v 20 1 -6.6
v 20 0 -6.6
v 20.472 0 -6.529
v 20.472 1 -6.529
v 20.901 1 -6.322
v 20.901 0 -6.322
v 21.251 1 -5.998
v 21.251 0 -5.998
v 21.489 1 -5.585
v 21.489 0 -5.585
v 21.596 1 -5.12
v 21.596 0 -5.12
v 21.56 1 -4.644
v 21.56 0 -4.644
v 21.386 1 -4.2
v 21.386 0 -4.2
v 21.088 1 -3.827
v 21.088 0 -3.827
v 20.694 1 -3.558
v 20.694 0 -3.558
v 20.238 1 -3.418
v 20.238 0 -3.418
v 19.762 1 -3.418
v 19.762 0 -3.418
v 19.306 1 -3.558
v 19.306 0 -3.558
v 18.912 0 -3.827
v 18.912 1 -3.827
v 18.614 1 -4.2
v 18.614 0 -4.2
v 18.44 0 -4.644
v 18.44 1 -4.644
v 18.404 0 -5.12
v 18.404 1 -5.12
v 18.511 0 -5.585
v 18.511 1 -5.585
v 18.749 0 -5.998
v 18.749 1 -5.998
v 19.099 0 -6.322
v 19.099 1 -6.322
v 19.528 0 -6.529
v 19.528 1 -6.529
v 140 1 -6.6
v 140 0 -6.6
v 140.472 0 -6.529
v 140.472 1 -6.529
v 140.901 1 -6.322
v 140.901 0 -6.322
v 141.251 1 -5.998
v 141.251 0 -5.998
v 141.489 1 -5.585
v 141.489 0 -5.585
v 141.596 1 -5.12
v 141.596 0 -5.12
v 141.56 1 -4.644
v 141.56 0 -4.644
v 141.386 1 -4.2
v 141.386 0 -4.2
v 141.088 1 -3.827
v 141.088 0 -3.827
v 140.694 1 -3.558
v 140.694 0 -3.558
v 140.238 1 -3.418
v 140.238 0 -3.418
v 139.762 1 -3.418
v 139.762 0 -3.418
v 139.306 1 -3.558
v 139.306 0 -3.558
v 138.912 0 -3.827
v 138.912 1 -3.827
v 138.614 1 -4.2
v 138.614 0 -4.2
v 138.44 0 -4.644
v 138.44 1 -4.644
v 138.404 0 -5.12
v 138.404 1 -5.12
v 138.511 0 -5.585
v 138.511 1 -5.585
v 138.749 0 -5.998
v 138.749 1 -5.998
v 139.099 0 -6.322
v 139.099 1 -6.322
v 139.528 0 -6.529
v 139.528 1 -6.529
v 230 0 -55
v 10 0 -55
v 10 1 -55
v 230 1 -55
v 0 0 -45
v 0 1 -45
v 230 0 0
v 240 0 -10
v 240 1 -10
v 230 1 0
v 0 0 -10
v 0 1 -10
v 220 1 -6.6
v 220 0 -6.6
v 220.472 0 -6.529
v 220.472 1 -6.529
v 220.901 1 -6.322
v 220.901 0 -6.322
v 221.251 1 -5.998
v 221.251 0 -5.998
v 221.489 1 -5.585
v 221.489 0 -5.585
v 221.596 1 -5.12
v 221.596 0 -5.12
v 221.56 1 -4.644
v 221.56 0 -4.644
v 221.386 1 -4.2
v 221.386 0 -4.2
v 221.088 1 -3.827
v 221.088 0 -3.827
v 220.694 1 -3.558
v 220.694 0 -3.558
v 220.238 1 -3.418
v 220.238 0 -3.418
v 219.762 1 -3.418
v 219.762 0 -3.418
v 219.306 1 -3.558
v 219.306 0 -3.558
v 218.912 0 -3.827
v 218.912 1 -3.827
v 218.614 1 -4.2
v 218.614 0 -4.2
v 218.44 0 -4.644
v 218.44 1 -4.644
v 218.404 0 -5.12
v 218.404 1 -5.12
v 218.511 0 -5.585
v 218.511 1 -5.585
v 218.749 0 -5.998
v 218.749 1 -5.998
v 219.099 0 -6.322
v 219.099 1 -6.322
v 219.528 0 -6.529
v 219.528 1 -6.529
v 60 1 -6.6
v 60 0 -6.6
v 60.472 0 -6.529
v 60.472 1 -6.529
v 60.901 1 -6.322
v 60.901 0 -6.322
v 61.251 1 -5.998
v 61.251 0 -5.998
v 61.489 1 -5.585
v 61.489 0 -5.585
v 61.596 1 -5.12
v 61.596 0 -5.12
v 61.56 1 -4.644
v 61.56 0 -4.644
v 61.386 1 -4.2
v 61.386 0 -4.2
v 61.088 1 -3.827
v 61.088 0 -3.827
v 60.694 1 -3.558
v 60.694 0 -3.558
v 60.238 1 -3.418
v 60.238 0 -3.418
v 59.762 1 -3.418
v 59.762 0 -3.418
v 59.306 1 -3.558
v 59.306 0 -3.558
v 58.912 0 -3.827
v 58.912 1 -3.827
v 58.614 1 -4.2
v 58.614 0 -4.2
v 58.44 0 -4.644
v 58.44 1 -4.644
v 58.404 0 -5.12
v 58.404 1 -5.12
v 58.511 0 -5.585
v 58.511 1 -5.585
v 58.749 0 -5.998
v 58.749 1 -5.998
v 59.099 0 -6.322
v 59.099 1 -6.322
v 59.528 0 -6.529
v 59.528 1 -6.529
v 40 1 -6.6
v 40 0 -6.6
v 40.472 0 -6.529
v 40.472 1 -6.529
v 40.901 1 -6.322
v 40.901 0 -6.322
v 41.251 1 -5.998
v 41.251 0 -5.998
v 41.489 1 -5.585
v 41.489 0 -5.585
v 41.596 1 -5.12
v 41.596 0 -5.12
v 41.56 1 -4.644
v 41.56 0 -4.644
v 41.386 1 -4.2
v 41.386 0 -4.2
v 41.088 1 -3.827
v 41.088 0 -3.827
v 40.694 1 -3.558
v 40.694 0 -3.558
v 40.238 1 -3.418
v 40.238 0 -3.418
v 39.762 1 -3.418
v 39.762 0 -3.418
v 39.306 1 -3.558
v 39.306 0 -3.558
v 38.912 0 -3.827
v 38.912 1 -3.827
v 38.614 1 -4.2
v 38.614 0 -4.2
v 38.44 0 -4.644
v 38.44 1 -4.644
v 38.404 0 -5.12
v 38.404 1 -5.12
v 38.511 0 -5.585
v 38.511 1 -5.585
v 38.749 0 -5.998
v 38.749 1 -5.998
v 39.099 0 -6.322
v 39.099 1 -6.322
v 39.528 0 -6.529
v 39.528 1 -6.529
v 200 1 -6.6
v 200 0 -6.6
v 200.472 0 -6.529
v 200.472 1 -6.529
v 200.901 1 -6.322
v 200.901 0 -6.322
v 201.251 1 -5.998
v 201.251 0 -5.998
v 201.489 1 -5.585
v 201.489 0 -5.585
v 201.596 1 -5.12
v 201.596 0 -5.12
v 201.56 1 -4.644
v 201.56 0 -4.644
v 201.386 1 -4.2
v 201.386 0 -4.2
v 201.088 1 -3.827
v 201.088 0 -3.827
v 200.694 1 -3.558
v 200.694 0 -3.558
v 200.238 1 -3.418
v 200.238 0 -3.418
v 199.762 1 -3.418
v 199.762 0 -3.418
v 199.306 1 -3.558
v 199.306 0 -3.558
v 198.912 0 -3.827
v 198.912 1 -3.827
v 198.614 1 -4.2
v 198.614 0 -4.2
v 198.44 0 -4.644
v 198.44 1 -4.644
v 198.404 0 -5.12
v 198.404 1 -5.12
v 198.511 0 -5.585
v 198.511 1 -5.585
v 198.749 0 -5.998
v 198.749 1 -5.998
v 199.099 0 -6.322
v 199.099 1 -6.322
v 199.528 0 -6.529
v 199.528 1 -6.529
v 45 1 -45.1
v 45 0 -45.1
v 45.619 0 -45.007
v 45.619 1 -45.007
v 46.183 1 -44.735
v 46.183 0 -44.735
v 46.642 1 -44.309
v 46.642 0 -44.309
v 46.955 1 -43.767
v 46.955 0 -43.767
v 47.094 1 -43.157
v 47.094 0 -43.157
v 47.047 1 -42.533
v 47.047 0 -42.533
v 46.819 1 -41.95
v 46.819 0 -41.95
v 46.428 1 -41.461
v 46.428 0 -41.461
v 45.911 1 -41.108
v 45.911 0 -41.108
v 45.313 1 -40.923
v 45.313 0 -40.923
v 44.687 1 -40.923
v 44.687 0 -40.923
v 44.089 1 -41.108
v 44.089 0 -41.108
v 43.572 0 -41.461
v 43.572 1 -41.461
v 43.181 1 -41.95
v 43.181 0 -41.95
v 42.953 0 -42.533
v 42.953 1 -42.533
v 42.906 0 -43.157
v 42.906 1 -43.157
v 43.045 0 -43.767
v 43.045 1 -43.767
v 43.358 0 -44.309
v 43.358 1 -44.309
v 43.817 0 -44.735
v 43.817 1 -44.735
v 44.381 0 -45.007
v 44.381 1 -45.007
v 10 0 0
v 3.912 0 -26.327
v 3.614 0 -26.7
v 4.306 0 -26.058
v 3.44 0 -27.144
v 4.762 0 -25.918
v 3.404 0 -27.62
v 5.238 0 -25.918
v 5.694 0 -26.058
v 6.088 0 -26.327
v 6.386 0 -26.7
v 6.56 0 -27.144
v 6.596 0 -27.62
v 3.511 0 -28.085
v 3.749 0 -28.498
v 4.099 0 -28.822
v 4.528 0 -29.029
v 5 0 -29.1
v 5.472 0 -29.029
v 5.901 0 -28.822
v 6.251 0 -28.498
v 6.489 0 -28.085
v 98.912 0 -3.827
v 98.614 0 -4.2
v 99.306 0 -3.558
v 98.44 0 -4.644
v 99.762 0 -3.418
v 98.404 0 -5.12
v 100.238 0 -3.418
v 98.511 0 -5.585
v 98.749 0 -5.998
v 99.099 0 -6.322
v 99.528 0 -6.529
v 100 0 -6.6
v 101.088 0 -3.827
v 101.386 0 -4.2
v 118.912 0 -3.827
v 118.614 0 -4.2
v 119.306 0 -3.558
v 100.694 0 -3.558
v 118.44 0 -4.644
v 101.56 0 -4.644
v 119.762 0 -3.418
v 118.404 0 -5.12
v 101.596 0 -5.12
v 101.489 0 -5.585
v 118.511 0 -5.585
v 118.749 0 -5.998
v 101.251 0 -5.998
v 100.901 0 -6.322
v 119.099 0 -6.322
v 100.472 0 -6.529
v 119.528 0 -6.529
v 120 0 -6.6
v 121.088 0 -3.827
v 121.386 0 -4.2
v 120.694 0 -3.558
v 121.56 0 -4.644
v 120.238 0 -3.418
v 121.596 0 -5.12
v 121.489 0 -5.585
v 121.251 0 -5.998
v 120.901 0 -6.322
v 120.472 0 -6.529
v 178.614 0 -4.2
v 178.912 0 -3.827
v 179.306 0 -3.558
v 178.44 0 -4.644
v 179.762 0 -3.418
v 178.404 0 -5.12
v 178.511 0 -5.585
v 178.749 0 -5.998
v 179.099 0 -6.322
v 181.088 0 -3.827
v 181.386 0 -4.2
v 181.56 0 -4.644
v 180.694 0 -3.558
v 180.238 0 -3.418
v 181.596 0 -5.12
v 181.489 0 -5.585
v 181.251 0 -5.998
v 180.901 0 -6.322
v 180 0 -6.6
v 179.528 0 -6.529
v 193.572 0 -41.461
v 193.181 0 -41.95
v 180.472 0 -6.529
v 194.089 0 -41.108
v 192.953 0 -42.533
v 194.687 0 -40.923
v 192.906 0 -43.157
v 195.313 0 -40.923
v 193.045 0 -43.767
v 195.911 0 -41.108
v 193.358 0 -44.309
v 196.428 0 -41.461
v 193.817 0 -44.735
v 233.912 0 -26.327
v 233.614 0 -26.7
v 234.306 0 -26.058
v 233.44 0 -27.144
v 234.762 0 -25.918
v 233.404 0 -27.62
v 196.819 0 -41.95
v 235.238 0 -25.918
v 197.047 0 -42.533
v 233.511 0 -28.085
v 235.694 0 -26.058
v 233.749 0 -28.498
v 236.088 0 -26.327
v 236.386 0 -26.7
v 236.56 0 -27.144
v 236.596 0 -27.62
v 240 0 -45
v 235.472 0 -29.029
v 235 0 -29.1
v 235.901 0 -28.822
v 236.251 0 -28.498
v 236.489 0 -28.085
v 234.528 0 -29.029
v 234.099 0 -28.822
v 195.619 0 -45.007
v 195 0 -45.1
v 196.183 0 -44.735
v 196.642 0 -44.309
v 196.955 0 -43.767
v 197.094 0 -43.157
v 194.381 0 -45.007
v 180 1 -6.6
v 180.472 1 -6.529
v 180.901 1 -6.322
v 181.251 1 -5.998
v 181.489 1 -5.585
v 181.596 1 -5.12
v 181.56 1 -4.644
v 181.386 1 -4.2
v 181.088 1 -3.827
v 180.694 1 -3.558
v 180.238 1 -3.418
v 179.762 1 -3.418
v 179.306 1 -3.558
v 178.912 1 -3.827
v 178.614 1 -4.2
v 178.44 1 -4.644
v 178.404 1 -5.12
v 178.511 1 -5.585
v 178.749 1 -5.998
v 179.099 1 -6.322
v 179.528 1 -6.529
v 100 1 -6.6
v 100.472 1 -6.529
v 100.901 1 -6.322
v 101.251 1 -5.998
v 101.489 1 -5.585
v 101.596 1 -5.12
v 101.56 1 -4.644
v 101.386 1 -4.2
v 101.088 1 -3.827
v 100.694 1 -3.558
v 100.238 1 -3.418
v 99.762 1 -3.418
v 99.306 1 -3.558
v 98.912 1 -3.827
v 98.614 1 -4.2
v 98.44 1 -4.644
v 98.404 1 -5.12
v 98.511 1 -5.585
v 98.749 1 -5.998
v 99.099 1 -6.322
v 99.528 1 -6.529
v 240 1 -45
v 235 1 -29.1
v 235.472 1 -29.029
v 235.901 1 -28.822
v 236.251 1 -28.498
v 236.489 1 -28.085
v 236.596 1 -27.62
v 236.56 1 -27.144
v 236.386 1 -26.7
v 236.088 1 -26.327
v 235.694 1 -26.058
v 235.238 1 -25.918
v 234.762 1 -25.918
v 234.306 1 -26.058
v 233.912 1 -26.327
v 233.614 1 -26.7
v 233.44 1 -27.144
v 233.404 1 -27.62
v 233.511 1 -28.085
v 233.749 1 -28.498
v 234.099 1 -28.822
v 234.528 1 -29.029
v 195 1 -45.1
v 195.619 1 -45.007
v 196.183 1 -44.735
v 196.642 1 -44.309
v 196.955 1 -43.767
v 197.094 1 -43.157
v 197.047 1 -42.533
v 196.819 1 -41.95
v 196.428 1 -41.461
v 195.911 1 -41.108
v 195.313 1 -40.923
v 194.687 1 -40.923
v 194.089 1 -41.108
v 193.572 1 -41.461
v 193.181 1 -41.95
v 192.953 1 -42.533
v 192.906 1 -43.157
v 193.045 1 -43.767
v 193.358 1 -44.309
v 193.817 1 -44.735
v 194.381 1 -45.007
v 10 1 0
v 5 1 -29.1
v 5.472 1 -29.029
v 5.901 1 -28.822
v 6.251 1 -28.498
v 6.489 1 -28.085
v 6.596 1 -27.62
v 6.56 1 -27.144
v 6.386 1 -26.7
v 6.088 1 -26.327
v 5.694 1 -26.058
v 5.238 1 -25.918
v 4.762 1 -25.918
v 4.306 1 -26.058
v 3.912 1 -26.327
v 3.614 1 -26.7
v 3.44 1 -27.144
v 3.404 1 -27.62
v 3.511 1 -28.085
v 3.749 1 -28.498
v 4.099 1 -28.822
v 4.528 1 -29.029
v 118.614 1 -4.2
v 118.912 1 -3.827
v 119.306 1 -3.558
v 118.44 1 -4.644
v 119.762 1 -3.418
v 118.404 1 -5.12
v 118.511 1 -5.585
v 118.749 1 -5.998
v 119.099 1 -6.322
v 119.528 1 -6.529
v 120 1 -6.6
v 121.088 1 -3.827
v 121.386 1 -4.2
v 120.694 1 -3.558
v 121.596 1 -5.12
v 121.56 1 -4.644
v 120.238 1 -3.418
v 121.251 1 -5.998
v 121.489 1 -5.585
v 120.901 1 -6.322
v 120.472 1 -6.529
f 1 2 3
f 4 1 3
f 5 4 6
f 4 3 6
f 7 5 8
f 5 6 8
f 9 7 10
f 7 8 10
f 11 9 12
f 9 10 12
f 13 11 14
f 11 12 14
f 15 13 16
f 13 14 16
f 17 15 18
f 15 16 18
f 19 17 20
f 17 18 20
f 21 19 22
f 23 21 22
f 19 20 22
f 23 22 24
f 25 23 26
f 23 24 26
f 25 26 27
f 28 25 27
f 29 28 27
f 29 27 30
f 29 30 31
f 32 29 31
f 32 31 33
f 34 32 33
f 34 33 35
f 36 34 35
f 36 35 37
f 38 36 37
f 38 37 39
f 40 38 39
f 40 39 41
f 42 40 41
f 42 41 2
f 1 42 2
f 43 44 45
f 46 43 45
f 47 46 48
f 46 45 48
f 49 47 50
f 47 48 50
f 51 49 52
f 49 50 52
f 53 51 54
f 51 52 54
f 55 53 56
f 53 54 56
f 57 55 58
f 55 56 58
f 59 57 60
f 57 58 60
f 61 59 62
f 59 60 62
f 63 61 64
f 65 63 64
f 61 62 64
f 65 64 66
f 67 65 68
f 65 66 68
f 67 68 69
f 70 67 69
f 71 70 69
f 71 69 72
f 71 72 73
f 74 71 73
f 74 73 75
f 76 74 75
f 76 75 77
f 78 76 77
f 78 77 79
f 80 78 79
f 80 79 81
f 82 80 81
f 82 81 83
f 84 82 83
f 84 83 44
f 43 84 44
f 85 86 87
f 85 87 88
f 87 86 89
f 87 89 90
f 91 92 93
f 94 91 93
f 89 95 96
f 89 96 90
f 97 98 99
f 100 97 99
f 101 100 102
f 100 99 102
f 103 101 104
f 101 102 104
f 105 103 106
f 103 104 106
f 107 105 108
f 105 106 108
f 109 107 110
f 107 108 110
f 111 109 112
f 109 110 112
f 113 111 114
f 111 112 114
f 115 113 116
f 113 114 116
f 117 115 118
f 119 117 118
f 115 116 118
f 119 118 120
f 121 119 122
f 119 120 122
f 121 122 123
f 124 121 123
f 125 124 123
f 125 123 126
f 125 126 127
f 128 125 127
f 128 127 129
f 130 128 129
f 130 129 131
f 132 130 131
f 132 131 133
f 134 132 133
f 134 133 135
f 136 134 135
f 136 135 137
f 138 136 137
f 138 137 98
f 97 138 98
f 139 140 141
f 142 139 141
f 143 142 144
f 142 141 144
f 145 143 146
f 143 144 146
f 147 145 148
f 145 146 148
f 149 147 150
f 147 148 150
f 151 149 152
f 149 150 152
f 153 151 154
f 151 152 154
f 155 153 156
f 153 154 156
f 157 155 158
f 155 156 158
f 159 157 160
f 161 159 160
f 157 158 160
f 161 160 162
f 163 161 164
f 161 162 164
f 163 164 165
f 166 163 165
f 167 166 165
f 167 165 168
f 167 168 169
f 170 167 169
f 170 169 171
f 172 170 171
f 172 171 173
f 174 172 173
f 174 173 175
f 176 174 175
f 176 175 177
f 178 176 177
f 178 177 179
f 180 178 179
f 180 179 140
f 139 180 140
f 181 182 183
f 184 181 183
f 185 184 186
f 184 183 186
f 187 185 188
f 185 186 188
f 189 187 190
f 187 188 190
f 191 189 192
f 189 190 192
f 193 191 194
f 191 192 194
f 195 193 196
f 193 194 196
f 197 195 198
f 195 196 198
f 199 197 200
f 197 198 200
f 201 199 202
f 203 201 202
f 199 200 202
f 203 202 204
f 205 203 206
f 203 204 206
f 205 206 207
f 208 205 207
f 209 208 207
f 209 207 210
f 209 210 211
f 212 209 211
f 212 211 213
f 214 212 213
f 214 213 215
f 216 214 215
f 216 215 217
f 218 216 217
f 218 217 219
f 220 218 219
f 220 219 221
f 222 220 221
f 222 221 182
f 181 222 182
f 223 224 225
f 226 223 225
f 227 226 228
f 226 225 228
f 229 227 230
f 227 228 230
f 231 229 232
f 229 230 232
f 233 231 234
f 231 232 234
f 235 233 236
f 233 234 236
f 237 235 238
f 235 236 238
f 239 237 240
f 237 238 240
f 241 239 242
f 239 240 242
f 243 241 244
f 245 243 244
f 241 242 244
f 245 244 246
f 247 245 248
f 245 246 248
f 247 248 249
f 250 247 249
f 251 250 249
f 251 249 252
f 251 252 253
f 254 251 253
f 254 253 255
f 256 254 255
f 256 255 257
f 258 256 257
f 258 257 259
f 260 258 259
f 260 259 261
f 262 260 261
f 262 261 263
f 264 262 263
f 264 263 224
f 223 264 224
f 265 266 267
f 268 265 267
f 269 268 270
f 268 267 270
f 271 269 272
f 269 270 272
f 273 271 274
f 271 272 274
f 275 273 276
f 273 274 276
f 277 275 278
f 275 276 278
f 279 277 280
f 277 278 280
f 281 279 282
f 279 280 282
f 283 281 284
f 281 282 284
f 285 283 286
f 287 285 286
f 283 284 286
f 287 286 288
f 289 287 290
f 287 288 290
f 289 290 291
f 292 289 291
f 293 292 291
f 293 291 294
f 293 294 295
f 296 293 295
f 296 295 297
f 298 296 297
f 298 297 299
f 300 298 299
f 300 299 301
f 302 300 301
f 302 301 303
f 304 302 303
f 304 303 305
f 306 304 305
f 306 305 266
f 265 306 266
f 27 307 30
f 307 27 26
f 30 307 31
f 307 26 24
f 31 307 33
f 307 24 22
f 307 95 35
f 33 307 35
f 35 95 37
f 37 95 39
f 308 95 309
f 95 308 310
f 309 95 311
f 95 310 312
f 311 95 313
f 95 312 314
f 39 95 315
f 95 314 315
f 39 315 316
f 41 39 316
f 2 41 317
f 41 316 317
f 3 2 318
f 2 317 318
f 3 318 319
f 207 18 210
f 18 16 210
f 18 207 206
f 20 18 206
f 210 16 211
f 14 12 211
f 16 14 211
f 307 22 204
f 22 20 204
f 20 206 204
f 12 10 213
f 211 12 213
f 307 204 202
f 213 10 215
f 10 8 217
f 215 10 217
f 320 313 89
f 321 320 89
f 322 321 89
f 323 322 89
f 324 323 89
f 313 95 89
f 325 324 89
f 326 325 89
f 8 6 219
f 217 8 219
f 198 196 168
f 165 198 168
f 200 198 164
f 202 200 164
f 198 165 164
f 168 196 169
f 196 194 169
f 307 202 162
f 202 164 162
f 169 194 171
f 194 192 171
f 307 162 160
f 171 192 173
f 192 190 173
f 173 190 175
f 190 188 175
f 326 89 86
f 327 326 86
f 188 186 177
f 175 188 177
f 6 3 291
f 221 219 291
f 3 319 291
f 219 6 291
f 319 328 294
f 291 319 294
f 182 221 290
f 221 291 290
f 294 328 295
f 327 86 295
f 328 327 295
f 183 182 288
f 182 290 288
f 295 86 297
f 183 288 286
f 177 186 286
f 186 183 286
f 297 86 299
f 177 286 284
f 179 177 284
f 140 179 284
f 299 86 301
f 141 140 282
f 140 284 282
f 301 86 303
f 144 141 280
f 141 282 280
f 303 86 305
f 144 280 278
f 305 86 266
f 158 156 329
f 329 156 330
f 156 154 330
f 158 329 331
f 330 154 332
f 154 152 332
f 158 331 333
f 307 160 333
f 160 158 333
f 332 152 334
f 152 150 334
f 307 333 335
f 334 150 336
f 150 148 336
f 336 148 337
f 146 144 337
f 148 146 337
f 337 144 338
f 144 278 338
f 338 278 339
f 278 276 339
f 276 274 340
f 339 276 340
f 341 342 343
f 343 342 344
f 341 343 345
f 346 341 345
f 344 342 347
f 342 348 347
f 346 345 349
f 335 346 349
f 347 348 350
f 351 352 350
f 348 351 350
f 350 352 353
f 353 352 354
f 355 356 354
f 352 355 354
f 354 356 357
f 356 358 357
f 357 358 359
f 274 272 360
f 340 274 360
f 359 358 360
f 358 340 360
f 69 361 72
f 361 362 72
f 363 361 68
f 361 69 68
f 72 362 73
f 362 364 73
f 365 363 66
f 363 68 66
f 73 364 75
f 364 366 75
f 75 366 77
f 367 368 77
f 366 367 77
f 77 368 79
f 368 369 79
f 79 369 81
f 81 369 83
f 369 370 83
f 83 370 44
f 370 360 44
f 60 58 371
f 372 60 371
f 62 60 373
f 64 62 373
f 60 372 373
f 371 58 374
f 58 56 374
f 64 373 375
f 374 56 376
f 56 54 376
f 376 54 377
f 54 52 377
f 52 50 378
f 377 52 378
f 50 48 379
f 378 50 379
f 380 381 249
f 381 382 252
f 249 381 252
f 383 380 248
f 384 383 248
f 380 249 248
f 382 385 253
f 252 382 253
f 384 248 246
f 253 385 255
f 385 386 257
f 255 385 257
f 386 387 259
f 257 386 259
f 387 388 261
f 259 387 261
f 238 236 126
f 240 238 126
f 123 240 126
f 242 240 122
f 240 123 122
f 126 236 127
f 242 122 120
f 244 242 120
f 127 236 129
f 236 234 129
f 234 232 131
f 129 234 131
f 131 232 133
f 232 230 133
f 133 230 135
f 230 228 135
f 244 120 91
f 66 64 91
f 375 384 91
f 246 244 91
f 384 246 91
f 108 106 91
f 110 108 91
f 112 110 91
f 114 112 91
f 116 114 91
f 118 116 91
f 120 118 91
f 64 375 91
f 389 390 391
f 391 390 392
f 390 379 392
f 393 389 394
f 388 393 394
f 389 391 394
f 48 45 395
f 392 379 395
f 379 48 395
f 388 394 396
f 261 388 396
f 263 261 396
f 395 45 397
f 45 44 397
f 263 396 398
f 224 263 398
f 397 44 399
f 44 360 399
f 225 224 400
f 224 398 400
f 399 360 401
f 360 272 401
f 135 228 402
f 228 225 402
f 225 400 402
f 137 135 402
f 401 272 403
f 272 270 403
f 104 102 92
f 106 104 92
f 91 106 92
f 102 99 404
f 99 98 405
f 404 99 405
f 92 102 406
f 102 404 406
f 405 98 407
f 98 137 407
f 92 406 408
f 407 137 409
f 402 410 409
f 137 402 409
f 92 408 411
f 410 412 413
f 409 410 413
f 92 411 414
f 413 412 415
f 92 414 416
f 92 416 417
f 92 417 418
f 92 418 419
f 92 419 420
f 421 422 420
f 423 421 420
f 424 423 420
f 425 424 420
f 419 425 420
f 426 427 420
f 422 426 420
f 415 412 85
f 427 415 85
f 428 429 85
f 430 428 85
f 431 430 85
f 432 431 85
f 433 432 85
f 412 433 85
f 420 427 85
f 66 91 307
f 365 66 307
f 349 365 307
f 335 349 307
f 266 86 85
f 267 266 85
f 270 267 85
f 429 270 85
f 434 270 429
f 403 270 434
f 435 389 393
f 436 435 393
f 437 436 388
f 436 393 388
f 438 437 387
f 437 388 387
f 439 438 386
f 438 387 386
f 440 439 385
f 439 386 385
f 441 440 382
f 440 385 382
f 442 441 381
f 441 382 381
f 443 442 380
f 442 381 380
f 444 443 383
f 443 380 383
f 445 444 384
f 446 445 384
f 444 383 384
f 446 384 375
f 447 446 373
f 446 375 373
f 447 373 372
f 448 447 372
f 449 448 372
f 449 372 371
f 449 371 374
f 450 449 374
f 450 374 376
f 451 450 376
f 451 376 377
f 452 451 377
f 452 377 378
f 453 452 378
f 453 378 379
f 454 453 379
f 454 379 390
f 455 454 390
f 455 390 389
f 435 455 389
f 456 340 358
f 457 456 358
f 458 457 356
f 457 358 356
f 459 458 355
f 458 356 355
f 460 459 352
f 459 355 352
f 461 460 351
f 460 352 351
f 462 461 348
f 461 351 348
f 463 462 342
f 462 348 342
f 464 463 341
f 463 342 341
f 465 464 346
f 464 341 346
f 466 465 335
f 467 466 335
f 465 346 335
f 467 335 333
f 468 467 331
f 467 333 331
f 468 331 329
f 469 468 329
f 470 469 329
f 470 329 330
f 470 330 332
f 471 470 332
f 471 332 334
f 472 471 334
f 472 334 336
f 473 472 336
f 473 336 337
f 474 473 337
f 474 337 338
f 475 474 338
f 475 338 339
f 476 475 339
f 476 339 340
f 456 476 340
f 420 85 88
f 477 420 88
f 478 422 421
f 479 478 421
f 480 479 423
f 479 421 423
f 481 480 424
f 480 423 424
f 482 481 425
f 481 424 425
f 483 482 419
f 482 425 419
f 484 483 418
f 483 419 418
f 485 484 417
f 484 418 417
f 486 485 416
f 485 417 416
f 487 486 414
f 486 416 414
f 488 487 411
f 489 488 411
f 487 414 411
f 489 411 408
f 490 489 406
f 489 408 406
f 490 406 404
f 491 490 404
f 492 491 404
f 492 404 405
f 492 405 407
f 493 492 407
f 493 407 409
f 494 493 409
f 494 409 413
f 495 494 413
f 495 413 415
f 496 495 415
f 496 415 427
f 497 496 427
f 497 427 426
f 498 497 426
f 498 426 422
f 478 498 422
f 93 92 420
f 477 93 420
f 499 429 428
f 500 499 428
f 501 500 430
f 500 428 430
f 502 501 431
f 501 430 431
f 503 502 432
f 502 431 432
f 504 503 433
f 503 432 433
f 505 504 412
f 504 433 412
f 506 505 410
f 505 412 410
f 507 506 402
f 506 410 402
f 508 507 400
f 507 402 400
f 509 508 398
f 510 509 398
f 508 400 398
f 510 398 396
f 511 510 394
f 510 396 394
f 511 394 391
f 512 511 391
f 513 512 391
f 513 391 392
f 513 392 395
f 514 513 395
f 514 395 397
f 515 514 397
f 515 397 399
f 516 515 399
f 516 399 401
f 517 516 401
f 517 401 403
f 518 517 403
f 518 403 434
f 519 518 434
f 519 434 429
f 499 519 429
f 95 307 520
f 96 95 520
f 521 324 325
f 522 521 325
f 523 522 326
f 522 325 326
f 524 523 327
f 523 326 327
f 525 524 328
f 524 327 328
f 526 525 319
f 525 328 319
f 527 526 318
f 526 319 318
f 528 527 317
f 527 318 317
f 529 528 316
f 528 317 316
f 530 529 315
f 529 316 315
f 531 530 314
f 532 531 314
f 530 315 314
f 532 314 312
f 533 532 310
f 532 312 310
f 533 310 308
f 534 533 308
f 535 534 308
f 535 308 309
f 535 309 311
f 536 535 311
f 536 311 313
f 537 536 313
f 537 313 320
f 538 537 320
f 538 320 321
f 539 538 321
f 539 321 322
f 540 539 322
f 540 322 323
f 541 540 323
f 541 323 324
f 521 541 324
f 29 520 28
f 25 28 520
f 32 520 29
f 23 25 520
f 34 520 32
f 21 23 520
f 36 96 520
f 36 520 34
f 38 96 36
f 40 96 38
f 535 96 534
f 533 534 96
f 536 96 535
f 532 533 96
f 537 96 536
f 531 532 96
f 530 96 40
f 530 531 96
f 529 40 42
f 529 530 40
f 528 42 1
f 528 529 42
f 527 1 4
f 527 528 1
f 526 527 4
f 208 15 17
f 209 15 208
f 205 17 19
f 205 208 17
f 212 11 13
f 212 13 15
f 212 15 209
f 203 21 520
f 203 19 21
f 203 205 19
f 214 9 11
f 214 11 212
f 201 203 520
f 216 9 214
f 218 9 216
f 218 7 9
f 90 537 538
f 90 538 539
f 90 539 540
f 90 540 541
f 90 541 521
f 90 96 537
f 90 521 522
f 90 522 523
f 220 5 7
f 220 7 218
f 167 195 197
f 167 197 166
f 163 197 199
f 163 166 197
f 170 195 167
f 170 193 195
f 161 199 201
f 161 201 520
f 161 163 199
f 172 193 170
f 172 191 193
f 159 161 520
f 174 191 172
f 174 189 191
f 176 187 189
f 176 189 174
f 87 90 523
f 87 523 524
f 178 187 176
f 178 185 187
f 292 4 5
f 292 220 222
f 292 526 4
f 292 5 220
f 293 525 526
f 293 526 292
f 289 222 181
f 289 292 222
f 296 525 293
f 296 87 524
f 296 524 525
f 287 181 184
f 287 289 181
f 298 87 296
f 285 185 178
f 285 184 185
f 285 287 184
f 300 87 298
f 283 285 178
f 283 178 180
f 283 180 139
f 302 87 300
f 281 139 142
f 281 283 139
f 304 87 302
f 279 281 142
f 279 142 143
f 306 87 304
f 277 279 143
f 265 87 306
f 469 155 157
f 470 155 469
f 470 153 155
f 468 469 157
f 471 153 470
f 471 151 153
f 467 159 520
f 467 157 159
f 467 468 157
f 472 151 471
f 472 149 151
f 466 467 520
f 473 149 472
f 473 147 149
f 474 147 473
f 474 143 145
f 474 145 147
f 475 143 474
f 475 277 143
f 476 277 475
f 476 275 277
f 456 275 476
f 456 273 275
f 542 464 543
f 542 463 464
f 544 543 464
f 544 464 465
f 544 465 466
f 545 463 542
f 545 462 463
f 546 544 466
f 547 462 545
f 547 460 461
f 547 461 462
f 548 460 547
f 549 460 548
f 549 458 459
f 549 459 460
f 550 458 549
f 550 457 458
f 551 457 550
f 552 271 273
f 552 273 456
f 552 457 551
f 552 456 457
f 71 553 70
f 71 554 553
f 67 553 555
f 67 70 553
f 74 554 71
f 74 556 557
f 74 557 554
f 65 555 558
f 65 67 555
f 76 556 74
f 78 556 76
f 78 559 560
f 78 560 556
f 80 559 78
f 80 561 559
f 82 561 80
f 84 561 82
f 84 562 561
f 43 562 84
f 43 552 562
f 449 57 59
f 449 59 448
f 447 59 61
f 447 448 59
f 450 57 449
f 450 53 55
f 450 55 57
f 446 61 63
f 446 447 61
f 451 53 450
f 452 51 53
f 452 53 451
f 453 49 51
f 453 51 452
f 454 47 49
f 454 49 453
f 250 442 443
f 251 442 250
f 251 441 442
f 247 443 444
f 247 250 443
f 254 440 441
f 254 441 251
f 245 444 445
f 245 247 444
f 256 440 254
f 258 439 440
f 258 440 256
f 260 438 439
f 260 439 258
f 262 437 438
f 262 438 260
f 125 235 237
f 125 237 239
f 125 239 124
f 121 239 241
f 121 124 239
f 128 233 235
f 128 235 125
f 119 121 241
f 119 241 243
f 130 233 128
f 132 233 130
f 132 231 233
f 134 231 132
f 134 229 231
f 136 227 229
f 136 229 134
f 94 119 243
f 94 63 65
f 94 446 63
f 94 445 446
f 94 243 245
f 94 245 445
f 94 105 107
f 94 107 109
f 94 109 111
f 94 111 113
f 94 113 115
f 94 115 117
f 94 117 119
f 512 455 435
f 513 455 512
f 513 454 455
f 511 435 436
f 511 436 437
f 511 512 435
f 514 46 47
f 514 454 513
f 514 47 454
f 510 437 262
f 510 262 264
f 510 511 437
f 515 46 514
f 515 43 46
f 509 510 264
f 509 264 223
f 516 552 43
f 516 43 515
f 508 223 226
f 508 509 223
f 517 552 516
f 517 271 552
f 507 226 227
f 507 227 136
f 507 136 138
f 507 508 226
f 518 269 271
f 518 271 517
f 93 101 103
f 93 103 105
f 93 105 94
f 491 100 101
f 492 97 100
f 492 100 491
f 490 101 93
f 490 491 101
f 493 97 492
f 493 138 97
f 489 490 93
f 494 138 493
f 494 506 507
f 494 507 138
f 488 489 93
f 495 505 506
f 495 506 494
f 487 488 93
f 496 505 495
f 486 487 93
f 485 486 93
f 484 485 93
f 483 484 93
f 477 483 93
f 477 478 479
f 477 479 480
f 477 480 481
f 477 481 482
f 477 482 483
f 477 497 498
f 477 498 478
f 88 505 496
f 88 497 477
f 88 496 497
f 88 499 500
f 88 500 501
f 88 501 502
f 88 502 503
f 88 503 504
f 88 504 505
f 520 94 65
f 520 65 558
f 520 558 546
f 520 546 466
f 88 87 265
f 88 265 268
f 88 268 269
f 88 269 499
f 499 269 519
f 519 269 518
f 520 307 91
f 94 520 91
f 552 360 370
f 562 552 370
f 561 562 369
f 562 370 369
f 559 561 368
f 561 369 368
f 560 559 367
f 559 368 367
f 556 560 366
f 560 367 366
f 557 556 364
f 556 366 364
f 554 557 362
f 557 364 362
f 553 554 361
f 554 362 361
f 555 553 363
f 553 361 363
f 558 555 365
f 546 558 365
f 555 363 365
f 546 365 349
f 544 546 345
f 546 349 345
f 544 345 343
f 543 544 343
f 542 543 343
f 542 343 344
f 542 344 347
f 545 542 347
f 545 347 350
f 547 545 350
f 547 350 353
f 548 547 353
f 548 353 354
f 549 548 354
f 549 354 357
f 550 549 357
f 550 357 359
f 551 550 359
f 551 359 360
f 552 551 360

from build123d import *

# Parameters (mm, degrees)
SKETCH_1_W          = 240
SKETCH_1_H          = 55
EXTRUDE_1_DEPTH     = 1
CHAMFER_1_SIZE      = 10
SKETCH_2_R          = 2.1
SKETCH_2_R_2        = 1.6
CUT_EXTRUDE_1_DEPTH = 10


with BuildPart() as part:
    # 草图1 → 凸台-拉伸1 (new body)
    with BuildSketch(Plane(origin=(0, 0, 0), x_dir=(1, 0, 0), z_dir=(0, 1, 0))):
        with Locations((120, 27.5)):
            Rectangle(SKETCH_1_W, SKETCH_1_H)
    extrude(amount=EXTRUDE_1_DEPTH)

    # 倒角1
    chamfer_1_edges = [part.edges().sort_by_distance(p)[0] for p in [
        (0, 0.5, -55),
        (240, 0.5, -55),
        (240, 0.5, 0),
        (0, 0.5, 0),
    ]]
    chamfer(chamfer_1_edges, length=CHAMFER_1_SIZE)

    # 草图2 → 切除-拉伸1 (cut)
    with BuildSketch(Plane.XZ):
        with Locations(Location((195, -43, 0), (0, 0, 270))):
            Circle(SKETCH_2_R)
        with Locations(Location((45, -43, 0), (0, 0, 270))):
            Circle(SKETCH_2_R)
        with Locations(Location((235, -27.5, 0), (0, 0, 270))):
            Circle(SKETCH_2_R_2)
        with Locations(Location((5, -27.5, 0), (0, 0, 270))):
            Circle(SKETCH_2_R_2)
        with Locations(Location((20, -5, 0), (0, 0, 270))):
            Circle(SKETCH_2_R_2)
        with Locations(Location((60, -5, 0), (0, 0, 270))):
            Circle(SKETCH_2_R_2)
        with Locations(Location((100, -5, 0), (0, 0, 270))):
            Circle(SKETCH_2_R_2)
        with Locations(Location((140, -5, 0), (0, 0, 270))):
            Circle(SKETCH_2_R_2)
        with Locations(Location((180, -5, 0), (0, 0, 270))):
            Circle(SKETCH_2_R_2)
        with Locations(Location((220, -5, 0), (0, 0, 270))):
            Circle(SKETCH_2_R_2)
        with Locations(Location((40, -5, 0), (0, 0, 270))):
            Circle(SKETCH_2_R_2)
        with Locations(Location((120, -5, 0), (0, 0, 270))):
            Circle(SKETCH_2_R_2)
        with Locations(Location((200, -5, 0), (0, 0, 270))):
            Circle(SKETCH_2_R_2)
    extrude(amount=-CUT_EXTRUDE_1_DEPTH, mode=Mode.SUBTRACT)


solid = part.part
